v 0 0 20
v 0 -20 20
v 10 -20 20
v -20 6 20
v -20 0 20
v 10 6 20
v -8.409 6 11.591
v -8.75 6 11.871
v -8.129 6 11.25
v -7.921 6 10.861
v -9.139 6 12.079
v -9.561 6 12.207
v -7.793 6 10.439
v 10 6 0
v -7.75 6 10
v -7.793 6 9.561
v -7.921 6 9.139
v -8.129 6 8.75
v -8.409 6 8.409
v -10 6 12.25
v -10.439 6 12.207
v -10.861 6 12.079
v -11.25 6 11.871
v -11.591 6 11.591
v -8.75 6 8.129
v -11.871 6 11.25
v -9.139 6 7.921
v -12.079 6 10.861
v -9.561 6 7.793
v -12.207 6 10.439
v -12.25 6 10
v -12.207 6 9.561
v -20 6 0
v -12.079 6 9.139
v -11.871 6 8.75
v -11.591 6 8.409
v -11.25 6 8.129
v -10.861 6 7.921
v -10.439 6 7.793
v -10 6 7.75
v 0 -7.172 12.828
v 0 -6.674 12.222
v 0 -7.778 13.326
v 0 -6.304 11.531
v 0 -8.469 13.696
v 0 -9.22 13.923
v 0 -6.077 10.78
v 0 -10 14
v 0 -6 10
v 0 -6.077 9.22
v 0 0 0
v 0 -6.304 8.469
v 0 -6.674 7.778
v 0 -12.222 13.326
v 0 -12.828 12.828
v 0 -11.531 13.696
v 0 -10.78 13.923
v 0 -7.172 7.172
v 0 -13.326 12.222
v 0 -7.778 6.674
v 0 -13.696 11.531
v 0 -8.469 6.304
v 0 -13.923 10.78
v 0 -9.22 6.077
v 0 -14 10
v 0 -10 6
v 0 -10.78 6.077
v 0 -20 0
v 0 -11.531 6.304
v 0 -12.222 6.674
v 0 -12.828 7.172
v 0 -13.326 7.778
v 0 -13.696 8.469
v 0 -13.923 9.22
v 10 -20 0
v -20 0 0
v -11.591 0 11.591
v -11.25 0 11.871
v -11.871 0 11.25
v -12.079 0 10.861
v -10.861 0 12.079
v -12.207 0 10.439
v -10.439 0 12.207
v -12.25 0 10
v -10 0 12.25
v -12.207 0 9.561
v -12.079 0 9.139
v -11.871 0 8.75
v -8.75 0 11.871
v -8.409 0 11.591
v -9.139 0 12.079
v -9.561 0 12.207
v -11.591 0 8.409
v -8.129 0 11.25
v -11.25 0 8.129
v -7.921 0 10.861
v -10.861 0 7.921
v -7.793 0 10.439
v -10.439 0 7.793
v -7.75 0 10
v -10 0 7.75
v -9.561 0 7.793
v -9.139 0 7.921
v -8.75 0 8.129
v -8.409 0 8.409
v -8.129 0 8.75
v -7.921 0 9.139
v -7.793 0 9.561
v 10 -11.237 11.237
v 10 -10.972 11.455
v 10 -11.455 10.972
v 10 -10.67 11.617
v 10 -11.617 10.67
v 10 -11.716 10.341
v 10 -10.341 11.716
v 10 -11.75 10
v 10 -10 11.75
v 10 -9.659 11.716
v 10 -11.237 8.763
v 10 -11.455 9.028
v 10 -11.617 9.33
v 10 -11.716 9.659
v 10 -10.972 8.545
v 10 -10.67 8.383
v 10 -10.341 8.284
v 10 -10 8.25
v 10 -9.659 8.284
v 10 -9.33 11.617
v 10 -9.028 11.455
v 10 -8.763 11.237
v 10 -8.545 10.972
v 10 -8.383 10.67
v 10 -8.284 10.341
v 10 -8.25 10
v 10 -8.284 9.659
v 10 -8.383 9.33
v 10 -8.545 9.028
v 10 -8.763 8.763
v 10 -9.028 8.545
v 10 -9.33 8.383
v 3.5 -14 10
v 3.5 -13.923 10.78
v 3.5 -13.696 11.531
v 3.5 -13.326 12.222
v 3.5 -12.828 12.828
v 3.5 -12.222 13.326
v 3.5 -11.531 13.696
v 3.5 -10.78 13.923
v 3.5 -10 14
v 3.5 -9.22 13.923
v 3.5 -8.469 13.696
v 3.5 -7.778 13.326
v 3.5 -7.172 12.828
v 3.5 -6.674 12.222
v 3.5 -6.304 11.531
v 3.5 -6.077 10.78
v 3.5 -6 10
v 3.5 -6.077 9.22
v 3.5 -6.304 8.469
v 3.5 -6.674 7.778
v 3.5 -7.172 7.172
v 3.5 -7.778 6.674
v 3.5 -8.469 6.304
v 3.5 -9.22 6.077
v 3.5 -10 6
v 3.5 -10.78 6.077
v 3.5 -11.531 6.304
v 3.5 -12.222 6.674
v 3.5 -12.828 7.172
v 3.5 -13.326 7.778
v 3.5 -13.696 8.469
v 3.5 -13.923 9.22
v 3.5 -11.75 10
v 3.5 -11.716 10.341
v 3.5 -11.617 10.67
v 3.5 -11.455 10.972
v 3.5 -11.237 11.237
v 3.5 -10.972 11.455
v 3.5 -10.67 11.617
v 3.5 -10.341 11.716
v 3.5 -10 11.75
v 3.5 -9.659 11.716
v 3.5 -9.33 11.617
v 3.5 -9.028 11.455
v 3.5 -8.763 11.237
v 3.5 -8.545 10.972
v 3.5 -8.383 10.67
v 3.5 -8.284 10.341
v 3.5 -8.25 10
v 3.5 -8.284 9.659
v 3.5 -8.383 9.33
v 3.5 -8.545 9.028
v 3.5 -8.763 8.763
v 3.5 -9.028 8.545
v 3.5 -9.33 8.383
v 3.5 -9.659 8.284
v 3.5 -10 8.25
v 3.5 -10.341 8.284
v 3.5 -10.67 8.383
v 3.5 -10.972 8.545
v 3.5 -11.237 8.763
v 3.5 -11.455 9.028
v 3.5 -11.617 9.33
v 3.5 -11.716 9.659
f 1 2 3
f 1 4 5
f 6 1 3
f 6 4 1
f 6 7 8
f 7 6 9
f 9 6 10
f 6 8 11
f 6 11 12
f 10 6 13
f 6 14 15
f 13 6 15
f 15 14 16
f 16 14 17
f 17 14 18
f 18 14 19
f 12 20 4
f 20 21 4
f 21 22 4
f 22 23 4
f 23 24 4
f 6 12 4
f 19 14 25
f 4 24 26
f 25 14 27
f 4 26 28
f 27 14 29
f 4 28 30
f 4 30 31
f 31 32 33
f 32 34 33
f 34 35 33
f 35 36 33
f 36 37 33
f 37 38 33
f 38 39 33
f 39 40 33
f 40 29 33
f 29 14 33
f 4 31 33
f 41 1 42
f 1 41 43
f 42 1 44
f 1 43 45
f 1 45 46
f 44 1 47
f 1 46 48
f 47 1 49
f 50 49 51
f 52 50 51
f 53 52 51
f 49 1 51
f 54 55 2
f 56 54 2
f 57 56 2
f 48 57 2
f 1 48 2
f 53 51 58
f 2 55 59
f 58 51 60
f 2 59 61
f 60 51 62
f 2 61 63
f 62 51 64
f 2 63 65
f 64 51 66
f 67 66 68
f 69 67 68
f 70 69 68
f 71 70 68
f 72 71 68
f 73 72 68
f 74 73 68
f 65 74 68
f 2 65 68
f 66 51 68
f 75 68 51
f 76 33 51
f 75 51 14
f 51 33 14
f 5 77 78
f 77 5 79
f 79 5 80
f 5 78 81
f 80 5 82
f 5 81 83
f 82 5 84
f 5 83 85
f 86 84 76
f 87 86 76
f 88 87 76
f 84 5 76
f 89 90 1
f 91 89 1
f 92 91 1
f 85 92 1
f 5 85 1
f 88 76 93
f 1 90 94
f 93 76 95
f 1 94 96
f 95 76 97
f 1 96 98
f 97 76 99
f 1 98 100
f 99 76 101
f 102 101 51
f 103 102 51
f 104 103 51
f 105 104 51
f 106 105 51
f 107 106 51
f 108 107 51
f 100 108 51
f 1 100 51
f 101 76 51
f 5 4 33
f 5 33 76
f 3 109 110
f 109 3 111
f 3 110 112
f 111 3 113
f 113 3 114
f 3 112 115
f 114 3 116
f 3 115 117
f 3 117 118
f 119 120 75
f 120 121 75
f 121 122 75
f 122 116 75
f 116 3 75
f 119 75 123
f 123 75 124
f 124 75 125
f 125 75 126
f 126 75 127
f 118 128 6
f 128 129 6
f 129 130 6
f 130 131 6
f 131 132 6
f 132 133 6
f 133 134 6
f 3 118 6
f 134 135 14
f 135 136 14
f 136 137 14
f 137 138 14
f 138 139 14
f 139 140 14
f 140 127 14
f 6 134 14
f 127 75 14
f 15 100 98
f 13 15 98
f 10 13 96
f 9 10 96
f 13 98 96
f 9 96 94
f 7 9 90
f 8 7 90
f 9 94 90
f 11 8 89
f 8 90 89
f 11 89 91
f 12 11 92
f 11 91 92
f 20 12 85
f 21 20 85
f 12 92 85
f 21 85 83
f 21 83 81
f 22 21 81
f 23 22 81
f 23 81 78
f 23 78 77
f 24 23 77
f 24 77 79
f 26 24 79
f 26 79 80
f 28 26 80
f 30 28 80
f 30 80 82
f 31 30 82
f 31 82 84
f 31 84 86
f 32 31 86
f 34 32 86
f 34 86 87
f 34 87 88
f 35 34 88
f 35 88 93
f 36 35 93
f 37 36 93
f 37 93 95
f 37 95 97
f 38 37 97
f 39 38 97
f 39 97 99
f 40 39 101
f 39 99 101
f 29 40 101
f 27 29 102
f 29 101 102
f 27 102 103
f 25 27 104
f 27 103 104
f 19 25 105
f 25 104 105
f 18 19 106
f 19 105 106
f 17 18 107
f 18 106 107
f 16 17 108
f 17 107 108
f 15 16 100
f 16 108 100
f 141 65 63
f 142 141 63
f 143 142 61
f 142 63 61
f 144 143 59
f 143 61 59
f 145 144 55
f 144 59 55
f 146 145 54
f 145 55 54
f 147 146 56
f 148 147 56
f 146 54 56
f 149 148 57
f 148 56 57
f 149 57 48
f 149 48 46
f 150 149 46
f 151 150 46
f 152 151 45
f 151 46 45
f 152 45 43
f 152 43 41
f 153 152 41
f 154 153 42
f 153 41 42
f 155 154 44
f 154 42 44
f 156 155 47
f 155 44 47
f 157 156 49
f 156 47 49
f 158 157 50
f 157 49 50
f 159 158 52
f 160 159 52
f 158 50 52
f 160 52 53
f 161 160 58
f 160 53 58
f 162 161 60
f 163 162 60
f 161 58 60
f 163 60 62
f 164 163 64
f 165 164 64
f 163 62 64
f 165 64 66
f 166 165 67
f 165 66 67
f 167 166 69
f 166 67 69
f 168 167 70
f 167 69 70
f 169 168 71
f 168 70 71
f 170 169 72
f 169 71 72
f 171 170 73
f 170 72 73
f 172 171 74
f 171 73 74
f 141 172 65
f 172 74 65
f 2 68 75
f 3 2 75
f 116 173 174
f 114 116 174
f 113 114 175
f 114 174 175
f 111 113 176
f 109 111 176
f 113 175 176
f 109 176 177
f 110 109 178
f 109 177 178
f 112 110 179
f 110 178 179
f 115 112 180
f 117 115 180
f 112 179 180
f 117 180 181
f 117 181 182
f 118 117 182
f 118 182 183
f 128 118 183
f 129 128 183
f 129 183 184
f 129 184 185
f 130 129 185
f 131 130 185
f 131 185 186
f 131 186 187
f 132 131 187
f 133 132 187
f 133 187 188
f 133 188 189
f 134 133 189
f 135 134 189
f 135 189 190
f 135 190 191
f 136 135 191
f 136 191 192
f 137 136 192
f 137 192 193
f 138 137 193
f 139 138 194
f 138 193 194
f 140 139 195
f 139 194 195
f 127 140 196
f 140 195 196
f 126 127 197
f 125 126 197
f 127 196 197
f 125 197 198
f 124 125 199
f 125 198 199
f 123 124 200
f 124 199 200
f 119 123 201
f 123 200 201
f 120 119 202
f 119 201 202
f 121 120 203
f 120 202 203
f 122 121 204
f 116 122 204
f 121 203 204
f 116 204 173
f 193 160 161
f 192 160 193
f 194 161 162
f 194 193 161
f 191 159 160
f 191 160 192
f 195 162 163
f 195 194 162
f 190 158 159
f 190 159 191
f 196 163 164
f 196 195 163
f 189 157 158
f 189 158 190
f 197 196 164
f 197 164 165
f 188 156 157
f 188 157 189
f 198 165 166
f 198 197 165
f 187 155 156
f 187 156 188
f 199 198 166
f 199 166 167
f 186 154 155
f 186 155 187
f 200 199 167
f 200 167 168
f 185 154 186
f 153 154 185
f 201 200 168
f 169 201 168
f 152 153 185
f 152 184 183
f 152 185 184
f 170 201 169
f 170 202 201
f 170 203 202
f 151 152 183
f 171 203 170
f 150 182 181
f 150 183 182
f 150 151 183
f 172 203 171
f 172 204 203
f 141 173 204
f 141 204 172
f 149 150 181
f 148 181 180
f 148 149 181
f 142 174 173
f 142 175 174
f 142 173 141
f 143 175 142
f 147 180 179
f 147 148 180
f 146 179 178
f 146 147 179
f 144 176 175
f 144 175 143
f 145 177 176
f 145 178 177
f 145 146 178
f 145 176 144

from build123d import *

# Parameters (mm, degrees)
PAD_DEPTH       = 20
SKETCH001_R     = 2.25
POCKET_DEPTH    = 6.001
SKETCH002_R     = 1.75
POCKET001_DEPTH = 10.001
SKETCH003_R     = 4
POCKET002_DEPTH = 3.5


with BuildPart() as part:
    # Sketch → Pad (new body)
    with BuildSketch(Plane.XY):
        Polygon((0, 0), (0, -20), (10, -20), (10, 6), (-20, 6), (-20, 0), align=None)
    extrude(amount=PAD_DEPTH)

    # Sketch001 → Pocket (cut, through all)
    with BuildSketch(Plane.XZ):
        with Locations((-10, 10)):
            Circle(SKETCH001_R)
    extrude(amount=-POCKET_DEPTH, mode=Mode.SUBTRACT)

    # Sketch002 → Pocket001 (cut, through all)
    with BuildSketch(Plane(origin=(0, 0, 0), x_dir=(0, -1, 0), z_dir=(-1, 0, 0))):
        with Locations((10, 10)):
            Circle(SKETCH002_R)
    extrude(amount=-POCKET001_DEPTH, mode=Mode.SUBTRACT)

    # Sketch003 → Pocket002 (cut)
    with BuildSketch(Plane(origin=(0, 0, 0), x_dir=(0, -1, 0), z_dir=(-1, 0, 0))):
        with Locations((10, 10)):
            Circle(SKETCH003_R)
    extrude(amount=-POCKET002_DEPTH, mode=Mode.SUBTRACT)


solid = part.part
